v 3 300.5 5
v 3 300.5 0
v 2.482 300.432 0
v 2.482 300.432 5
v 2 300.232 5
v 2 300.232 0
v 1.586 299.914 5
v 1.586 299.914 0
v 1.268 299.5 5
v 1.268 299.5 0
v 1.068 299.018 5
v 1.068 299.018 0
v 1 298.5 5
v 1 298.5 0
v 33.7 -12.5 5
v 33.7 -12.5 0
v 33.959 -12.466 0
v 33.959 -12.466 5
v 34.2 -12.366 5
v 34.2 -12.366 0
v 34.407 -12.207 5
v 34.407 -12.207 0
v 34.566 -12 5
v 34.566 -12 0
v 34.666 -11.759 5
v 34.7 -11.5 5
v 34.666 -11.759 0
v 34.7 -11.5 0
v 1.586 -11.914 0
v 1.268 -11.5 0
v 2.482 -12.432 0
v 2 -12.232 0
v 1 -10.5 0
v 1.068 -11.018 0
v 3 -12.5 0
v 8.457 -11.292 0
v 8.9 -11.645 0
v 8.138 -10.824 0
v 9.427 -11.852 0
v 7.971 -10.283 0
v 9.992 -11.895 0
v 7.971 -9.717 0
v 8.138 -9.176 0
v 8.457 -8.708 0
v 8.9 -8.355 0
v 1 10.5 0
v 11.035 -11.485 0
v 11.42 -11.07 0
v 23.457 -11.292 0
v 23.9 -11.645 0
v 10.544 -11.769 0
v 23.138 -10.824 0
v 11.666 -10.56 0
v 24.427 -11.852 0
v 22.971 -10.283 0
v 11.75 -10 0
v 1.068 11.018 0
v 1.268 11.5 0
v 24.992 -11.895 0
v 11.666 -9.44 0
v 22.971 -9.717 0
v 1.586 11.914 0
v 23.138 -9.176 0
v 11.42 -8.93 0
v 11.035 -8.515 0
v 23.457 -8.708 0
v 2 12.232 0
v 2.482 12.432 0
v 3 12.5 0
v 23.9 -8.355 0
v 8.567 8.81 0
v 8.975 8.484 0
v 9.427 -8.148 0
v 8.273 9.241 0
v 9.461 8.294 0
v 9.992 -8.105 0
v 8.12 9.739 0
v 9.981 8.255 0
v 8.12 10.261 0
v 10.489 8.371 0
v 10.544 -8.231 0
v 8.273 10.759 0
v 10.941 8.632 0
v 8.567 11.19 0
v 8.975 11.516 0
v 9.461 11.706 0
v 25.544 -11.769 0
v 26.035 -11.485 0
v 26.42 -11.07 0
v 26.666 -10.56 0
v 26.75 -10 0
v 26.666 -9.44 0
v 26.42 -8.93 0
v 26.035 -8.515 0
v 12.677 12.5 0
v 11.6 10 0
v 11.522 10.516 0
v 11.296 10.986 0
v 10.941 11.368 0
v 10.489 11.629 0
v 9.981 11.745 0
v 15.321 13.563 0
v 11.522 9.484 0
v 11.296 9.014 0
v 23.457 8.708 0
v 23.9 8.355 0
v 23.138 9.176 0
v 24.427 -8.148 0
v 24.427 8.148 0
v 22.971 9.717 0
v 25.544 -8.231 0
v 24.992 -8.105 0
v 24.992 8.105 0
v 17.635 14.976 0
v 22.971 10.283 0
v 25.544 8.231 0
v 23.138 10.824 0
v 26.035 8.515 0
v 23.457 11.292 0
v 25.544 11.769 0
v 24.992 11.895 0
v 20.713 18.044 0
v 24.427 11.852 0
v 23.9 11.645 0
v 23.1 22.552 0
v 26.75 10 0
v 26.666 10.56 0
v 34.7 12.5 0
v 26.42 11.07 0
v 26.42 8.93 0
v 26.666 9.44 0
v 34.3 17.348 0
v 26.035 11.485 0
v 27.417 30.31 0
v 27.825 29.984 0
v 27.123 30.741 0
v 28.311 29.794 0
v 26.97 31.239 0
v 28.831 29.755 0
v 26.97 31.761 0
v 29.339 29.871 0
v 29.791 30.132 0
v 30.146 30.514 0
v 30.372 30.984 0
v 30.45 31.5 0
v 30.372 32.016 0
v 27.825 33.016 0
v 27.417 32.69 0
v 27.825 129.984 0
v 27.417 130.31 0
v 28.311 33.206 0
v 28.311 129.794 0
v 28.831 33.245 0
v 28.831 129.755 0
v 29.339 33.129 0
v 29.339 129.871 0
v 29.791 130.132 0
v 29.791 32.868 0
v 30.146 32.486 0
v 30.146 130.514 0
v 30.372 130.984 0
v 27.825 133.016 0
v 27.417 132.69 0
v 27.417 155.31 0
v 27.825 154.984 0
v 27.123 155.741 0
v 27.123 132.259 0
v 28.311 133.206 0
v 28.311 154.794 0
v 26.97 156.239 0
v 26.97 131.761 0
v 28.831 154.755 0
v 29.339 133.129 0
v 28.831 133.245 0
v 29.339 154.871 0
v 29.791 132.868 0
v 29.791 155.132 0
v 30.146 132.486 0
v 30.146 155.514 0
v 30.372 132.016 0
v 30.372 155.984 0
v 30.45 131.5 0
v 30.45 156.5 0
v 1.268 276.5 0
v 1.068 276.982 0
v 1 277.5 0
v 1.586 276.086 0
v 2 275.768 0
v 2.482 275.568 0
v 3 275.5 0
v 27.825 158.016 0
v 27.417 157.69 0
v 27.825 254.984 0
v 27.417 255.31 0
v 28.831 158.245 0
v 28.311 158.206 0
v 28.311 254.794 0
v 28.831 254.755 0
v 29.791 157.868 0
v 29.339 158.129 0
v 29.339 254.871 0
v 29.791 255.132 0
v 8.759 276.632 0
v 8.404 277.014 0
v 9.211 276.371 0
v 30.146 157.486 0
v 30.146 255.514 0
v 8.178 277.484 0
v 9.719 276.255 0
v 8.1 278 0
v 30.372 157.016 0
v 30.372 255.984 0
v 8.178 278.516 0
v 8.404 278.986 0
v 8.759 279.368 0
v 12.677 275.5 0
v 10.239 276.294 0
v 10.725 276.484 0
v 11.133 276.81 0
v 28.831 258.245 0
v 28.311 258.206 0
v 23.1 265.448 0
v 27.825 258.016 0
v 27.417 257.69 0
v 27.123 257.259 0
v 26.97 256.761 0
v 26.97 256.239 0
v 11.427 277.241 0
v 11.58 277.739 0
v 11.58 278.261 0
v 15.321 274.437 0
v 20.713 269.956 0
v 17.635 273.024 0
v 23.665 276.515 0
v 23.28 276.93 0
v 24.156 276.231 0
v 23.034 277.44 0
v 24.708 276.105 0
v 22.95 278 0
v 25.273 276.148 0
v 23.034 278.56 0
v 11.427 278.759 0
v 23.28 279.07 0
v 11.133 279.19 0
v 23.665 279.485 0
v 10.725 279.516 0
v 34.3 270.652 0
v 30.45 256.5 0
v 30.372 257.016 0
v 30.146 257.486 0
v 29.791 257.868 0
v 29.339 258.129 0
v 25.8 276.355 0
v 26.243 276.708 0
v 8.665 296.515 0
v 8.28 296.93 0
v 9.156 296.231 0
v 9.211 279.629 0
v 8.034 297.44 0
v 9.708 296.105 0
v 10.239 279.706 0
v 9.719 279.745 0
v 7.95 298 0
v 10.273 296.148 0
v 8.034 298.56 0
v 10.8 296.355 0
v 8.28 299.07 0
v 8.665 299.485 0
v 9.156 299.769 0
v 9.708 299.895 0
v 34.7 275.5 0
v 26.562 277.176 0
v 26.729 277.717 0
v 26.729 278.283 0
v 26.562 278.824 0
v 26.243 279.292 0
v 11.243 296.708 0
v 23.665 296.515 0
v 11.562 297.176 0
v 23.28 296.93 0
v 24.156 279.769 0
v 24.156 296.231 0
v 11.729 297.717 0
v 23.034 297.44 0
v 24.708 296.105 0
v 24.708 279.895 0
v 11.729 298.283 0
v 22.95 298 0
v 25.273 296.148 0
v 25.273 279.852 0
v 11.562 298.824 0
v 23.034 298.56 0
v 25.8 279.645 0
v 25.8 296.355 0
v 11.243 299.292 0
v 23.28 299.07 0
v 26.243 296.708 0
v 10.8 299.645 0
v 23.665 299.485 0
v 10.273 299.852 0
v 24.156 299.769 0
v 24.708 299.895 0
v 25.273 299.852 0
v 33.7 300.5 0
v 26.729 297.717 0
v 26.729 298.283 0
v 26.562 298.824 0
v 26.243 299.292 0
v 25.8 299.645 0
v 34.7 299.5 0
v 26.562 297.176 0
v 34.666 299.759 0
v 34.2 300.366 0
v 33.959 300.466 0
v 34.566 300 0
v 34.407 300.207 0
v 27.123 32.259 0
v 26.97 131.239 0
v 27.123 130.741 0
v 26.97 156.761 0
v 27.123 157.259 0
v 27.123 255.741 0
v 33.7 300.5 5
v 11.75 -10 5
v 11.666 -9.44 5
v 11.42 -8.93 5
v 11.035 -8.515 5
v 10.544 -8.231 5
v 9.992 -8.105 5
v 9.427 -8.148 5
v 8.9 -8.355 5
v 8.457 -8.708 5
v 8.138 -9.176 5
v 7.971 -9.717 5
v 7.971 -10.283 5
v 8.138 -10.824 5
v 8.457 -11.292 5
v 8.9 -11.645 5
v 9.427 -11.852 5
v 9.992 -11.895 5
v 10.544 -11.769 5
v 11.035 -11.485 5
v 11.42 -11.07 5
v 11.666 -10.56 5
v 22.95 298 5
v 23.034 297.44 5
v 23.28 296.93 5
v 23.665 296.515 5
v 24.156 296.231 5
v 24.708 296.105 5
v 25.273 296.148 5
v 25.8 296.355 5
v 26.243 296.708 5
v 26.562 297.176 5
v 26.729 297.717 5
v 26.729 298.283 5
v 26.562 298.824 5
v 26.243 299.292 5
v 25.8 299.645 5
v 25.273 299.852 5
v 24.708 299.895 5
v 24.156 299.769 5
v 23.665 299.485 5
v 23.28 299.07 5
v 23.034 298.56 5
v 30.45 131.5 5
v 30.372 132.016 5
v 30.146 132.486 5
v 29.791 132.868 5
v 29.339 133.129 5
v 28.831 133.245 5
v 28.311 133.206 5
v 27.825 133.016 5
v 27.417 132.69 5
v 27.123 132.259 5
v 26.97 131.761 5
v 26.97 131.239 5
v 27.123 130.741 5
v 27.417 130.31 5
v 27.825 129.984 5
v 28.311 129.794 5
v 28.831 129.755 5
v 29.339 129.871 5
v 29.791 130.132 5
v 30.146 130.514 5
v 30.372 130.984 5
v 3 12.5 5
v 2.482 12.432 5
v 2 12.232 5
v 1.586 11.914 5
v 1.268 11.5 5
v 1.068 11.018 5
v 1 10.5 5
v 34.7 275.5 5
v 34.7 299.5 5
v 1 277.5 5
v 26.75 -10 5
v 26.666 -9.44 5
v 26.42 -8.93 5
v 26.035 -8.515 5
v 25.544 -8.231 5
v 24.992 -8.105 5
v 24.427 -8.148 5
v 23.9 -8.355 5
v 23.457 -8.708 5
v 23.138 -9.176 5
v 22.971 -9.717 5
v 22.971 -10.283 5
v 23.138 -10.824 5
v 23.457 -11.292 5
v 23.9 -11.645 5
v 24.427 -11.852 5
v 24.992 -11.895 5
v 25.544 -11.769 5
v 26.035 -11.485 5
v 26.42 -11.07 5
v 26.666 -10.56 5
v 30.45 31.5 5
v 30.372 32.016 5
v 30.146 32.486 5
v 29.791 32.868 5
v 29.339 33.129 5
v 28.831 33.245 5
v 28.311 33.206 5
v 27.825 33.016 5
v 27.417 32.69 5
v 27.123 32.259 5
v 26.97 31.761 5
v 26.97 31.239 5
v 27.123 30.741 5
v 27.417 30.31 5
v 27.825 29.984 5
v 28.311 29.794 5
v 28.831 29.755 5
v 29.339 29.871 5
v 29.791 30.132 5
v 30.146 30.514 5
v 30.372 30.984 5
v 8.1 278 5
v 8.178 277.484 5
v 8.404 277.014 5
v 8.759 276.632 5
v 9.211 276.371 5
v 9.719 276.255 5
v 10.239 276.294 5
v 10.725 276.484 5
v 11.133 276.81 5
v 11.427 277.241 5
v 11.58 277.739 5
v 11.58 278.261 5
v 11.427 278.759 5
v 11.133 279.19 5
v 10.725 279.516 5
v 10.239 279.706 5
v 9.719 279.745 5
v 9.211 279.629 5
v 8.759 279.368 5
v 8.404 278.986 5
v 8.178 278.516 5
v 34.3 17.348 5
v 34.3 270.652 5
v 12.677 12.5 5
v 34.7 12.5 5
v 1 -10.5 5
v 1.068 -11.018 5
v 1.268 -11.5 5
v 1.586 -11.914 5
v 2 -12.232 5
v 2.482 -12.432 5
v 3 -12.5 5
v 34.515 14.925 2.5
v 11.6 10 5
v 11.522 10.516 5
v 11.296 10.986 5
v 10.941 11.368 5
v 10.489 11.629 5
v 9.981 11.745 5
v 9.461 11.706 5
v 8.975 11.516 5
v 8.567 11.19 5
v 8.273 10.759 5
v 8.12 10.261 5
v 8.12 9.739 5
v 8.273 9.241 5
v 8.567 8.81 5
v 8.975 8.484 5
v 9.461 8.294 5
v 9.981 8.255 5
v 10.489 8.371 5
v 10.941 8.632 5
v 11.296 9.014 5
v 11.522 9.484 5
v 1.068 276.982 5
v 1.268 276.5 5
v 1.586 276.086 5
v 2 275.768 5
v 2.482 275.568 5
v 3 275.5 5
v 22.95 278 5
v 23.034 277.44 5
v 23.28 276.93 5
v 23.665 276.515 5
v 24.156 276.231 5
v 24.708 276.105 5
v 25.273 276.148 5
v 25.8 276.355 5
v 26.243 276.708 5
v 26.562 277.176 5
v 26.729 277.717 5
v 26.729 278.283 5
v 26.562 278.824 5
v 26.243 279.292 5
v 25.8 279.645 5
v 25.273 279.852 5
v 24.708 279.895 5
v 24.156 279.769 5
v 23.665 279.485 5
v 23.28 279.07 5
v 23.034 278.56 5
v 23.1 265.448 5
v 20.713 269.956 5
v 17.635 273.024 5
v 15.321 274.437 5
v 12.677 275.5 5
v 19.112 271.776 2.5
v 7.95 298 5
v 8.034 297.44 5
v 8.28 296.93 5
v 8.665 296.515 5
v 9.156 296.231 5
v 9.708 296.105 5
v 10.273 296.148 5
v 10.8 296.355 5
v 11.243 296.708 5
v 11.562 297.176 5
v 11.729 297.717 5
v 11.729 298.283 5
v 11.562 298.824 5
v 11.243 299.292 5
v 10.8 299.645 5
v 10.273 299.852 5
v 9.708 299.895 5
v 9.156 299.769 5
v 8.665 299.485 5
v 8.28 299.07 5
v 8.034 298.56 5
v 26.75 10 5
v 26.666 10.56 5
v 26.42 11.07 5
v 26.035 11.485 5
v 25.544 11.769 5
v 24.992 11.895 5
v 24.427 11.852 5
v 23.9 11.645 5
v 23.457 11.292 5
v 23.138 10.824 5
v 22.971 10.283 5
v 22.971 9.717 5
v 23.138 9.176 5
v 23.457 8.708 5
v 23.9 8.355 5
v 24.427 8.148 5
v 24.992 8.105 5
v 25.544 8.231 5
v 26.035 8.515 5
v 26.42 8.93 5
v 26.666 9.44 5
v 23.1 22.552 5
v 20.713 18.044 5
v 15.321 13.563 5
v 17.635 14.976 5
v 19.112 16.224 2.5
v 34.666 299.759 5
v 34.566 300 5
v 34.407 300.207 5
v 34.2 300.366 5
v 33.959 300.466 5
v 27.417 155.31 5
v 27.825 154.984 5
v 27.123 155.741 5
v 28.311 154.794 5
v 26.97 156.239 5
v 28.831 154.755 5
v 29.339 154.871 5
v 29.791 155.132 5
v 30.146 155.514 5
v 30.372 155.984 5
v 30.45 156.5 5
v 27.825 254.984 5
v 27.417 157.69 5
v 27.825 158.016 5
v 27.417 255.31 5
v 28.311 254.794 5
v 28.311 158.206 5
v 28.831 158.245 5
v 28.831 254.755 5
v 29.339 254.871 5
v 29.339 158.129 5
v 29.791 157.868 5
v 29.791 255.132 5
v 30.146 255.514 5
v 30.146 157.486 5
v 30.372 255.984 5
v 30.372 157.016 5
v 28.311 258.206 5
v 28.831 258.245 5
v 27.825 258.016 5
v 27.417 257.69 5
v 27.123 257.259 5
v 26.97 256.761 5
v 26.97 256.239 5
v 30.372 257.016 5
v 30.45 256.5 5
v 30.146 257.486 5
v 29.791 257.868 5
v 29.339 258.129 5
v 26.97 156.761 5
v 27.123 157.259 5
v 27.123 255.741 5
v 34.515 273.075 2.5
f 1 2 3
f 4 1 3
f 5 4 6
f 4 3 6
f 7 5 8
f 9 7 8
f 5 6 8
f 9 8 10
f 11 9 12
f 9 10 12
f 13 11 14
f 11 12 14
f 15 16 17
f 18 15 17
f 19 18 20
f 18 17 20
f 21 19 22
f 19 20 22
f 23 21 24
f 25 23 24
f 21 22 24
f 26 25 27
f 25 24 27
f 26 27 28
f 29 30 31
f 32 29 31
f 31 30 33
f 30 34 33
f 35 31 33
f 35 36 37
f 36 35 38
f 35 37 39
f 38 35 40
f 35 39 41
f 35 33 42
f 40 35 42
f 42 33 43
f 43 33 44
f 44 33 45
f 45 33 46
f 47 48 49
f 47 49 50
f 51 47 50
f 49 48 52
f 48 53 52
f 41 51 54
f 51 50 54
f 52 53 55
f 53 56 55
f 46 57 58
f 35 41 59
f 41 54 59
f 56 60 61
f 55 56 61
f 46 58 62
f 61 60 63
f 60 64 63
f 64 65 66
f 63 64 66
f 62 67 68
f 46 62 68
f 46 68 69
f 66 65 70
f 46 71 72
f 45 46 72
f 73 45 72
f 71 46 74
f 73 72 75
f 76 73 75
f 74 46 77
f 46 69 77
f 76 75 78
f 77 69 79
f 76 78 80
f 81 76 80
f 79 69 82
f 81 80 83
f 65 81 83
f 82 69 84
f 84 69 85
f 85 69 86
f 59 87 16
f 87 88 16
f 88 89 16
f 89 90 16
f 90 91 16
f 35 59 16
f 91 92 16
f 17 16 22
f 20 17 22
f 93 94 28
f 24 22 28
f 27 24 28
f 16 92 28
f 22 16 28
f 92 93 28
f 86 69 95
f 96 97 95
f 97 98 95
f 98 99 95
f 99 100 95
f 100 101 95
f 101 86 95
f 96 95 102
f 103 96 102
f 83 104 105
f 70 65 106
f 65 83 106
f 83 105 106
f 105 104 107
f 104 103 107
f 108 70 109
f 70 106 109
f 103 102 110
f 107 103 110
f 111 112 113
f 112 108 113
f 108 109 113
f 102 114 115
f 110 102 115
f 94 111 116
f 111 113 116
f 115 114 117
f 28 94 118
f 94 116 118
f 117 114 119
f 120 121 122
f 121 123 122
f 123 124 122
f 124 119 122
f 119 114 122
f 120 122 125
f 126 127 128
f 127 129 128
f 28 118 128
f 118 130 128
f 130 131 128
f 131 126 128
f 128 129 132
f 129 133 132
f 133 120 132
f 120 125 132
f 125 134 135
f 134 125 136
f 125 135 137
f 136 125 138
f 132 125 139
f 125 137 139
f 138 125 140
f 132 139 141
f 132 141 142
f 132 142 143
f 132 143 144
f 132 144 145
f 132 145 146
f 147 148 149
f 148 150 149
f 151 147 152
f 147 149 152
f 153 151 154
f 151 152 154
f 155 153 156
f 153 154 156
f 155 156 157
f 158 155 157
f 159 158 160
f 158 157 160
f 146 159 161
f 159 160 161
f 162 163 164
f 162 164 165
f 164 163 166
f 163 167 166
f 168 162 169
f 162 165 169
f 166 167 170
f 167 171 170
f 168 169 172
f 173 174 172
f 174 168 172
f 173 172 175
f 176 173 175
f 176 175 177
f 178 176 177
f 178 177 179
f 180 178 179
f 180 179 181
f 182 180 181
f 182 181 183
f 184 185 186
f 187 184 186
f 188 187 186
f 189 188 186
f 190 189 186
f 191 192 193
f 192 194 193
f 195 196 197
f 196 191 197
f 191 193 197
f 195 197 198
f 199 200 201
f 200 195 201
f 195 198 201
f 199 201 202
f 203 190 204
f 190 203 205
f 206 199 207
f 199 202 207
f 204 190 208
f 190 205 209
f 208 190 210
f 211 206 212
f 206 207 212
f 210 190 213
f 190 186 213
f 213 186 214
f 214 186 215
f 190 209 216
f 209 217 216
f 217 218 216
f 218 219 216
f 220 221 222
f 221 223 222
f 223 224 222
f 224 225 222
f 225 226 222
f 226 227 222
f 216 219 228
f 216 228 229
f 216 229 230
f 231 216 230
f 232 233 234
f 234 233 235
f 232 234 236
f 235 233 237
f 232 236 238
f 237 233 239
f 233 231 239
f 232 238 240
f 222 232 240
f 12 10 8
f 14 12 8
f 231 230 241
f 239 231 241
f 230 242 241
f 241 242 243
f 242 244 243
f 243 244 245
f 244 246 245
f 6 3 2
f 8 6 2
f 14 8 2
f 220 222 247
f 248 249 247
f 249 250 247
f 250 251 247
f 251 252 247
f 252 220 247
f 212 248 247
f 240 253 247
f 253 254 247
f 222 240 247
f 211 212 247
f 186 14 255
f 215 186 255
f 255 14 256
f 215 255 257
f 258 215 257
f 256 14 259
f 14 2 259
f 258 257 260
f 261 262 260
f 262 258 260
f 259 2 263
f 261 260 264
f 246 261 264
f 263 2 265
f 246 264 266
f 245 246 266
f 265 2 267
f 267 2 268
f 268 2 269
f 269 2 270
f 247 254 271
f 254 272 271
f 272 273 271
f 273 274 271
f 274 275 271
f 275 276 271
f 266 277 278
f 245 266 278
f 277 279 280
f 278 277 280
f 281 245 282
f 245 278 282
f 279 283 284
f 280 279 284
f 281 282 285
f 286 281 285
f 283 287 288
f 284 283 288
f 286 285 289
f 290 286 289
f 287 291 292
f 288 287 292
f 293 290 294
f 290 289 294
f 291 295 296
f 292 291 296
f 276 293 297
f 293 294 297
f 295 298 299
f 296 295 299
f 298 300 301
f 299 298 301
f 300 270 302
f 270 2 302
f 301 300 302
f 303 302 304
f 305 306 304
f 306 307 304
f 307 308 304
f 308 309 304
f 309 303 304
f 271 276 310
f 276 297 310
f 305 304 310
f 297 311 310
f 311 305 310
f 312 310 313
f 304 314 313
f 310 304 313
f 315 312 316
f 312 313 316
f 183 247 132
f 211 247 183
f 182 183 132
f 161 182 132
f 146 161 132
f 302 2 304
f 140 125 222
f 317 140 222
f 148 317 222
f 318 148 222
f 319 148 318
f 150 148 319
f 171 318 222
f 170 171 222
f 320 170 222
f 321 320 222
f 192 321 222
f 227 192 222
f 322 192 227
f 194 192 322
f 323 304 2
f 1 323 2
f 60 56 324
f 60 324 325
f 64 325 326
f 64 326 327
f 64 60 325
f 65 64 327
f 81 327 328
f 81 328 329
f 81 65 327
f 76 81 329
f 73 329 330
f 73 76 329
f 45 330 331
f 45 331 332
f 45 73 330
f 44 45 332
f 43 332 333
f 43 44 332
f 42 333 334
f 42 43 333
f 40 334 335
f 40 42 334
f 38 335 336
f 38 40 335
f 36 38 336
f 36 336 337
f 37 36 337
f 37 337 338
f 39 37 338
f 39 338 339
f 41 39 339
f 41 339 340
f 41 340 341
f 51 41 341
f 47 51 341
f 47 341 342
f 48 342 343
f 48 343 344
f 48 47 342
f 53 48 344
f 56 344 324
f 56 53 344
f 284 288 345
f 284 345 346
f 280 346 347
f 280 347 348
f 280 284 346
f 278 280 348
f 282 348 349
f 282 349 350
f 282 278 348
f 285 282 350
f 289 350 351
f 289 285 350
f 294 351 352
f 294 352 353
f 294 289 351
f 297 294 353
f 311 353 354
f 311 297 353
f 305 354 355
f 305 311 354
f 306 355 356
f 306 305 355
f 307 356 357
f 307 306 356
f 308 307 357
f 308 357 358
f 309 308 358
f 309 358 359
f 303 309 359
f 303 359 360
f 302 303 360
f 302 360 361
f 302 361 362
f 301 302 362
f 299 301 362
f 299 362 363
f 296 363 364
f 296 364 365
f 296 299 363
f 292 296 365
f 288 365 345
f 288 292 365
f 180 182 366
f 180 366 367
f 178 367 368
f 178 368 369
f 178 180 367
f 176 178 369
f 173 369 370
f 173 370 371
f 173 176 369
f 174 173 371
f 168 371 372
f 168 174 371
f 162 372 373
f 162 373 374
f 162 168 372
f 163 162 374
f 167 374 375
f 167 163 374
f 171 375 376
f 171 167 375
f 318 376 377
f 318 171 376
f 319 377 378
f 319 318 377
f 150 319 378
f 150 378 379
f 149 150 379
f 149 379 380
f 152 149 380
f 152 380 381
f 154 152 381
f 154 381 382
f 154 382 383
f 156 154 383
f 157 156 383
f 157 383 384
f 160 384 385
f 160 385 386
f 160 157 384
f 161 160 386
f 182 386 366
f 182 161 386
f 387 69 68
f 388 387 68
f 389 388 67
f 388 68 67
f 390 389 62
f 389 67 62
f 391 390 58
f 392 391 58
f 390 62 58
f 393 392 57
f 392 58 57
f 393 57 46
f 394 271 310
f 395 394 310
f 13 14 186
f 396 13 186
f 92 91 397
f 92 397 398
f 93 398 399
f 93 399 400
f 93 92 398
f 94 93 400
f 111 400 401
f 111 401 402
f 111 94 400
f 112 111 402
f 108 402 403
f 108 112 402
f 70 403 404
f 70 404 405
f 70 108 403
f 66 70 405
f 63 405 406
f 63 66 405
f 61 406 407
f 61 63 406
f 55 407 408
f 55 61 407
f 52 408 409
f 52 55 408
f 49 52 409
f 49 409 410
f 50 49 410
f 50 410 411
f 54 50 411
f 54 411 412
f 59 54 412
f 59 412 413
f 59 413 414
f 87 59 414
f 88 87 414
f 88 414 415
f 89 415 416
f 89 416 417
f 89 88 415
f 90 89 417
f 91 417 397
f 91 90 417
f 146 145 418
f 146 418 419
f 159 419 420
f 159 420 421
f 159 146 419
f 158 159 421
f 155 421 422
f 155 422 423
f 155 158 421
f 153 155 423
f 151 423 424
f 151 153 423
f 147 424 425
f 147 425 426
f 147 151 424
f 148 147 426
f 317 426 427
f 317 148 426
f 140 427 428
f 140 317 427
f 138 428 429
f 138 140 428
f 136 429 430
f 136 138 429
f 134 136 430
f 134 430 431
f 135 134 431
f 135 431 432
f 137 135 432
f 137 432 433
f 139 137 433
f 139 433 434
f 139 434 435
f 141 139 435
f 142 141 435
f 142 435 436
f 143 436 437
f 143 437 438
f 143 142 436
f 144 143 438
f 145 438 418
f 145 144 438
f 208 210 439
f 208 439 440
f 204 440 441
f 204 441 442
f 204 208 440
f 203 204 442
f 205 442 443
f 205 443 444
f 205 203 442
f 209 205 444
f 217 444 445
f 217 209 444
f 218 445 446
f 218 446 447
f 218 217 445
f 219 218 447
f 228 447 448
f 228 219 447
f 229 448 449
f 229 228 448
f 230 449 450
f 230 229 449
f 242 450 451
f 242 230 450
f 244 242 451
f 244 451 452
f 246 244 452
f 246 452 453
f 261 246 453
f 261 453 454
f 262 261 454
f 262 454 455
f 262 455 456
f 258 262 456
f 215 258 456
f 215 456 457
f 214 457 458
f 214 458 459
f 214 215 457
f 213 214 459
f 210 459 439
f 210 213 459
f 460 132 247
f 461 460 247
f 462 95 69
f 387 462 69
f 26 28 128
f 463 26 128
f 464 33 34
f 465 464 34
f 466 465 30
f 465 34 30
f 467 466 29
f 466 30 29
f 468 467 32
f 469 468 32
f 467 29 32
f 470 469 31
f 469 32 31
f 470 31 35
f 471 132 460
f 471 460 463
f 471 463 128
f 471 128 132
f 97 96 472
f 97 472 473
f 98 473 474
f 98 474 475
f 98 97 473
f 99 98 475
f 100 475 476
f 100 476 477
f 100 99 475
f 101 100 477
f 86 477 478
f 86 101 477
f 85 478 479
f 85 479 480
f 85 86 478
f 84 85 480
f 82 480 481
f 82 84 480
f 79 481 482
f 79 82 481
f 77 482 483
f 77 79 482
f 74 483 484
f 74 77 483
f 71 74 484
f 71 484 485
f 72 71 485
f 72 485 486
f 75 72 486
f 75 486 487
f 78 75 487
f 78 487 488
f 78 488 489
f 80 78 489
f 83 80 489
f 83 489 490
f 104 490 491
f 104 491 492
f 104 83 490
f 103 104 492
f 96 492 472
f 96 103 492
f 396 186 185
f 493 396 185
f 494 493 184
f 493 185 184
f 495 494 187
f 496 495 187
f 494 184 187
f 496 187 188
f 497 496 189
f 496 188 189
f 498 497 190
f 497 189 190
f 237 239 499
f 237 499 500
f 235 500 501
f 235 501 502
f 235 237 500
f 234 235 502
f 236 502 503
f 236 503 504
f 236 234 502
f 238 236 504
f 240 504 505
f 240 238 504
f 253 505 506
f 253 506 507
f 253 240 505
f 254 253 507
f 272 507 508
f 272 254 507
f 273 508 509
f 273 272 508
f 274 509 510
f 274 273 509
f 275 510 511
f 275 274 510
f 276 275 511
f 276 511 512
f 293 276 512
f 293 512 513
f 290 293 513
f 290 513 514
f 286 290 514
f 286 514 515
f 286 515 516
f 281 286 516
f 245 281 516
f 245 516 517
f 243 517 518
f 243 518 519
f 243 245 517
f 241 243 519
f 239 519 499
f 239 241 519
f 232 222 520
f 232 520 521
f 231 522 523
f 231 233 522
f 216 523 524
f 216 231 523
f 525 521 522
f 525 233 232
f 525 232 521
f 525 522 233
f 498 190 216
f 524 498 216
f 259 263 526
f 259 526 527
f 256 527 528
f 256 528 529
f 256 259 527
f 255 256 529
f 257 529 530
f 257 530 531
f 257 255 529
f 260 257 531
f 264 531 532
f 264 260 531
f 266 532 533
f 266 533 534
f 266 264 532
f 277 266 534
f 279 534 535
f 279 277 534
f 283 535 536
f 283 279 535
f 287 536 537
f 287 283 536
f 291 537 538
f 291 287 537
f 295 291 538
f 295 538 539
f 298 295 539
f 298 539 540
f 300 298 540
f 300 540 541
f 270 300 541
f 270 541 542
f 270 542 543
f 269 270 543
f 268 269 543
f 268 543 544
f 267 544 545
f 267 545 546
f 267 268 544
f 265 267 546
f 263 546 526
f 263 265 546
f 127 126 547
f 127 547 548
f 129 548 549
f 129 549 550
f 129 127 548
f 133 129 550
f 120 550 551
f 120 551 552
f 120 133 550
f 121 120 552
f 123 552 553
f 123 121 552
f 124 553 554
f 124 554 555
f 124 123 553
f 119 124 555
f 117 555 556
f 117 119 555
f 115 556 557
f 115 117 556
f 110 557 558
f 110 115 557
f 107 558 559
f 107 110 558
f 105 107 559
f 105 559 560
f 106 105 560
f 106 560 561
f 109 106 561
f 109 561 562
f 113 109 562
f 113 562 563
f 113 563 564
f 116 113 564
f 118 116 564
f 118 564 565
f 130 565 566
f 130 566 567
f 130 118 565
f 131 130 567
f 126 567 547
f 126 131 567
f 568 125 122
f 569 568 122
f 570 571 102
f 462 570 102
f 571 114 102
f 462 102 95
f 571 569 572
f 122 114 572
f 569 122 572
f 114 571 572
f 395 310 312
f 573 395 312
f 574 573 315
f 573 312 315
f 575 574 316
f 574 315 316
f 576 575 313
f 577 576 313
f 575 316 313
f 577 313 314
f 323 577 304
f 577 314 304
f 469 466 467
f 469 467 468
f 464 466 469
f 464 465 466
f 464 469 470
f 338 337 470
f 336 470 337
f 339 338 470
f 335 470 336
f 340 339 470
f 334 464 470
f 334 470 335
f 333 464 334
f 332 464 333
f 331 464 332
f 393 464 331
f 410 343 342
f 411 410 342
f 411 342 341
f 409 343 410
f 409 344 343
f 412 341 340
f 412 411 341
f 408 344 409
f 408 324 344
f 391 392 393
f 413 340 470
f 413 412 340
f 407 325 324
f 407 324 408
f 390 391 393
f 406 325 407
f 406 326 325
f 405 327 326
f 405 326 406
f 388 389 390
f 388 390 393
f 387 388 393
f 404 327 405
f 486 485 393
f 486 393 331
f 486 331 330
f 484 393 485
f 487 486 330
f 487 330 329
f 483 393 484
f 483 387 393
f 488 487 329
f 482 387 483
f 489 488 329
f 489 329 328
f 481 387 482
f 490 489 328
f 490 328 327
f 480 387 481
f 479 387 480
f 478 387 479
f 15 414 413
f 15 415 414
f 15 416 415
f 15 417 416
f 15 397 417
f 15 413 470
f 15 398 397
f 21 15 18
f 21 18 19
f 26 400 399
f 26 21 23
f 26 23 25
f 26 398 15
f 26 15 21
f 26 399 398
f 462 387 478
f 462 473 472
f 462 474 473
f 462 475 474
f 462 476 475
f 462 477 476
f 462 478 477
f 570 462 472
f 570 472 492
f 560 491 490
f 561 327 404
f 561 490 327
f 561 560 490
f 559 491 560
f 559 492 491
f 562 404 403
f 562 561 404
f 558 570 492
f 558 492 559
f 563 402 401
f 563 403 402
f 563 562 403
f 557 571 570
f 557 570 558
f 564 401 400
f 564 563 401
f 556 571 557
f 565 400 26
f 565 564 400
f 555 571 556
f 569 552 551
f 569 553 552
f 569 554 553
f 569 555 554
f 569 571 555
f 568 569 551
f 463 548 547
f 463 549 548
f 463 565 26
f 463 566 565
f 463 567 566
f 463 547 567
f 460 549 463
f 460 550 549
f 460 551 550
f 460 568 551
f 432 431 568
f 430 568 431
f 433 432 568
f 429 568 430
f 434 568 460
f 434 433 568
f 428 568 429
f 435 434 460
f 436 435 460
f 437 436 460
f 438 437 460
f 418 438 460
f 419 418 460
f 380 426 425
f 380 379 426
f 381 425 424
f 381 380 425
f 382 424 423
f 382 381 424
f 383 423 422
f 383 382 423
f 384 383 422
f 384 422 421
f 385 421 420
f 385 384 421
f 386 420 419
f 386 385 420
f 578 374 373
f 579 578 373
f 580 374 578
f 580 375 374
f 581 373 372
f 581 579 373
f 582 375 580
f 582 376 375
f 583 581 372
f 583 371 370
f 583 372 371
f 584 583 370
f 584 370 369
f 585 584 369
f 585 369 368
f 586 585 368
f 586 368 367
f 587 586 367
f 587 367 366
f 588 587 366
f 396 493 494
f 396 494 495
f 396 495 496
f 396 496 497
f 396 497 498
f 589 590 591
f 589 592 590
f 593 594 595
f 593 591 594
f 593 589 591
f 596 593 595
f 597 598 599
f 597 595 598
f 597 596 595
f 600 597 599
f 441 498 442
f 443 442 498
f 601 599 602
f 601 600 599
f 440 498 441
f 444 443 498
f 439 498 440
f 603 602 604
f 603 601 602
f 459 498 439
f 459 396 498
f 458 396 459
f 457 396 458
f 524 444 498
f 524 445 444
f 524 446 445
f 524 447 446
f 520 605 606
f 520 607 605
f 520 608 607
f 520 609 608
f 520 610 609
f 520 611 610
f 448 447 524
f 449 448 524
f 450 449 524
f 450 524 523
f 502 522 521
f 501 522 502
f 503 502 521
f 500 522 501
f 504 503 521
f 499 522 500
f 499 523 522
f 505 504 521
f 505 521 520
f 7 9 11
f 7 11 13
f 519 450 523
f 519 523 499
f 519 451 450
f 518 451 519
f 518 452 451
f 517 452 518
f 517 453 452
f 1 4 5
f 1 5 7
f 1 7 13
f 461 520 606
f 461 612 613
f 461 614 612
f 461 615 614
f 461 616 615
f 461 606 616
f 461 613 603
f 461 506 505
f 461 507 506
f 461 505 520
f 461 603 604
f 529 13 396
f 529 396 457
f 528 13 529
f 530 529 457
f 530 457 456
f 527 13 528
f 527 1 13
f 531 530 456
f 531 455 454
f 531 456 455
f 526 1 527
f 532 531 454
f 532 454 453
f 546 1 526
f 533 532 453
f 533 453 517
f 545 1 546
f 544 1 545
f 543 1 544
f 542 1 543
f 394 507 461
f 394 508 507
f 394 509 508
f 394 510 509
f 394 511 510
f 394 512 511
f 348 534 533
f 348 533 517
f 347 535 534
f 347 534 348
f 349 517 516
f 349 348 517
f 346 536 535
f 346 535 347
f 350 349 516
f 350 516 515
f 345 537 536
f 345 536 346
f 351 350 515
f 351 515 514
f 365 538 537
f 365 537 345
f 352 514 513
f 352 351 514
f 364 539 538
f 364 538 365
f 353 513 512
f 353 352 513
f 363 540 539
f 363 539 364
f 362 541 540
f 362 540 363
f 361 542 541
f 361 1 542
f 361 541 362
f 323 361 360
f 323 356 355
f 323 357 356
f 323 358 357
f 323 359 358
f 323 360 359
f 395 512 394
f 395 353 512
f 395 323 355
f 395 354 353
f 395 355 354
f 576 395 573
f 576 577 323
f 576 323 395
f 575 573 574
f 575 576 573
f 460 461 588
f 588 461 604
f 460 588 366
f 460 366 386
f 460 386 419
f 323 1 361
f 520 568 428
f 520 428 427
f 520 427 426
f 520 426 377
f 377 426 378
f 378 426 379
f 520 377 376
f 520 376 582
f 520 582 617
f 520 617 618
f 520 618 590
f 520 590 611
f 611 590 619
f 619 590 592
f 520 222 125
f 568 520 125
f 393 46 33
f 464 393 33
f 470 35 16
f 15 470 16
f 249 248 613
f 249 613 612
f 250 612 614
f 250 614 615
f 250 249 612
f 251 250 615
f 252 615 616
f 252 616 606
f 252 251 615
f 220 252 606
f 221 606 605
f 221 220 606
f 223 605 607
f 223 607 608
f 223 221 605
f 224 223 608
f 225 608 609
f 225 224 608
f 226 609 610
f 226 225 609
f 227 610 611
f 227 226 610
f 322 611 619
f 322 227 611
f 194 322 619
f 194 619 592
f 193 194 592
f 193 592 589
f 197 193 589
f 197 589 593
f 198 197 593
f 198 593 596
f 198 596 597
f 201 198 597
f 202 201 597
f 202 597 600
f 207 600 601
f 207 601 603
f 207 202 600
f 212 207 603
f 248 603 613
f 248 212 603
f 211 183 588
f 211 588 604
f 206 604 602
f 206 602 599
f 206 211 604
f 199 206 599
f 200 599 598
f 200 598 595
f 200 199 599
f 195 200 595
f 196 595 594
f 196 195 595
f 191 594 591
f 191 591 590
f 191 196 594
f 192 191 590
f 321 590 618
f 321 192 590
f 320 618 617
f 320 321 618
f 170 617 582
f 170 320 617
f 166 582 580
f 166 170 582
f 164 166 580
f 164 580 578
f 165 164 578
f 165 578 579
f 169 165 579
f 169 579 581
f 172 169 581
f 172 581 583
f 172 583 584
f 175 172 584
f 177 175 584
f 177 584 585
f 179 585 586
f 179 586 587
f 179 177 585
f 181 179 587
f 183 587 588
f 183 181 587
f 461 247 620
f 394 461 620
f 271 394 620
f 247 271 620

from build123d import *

# Parameters (mm, degrees)
SKETCH1_R           = 1.9
SKETCH1_R_2         = 1.75
BOSS_EXTRUDE1_DEPTH = 5


with BuildPart() as part:
    # Sketch1 → Boss-Extrude1 (new body)
    with BuildSketch(Plane.XY):
        with BuildLine():
            Line((22.7, -12.5), (33.7, -12.5))
            ThreePointArc((33.7, -12.5), (34.407106781, -12.207106781), (34.7, -11.5))
            Line((34.7, -11.5), (34.7, 12.5))
            add(Edge.make_bspline(
                [(34.3, 17.348309182), (34.529755129, 14.926573724), (34.7, 12.5)],
                knots=[0, 0, 0, 1, 1, 1], degree=2))
            Line((34.3, 17.348309182), (34.3, 270.651690818))
            add(Edge.make_bspline(
                [(34.3, 270.651690818), (34.529755129, 273.073426276), (34.7, 275.5)],
                knots=[0, 0, 0, 1, 1, 1], degree=2))
            Line((34.7, 275.5), (34.7, 299.5))
            ThreePointArc((34.7, 299.5), (34.407106781, 300.207106781), (33.7, 300.5))
            Line((33.7, 300.5), (22.7, 300.5))
            Line((22.7, 300.5), (3, 300.5))
            ThreePointArc((3, 300.5), (1.585786438, 299.914213562), (1, 298.5))
            Line((1, 298.5), (1, 277.5))
            ThreePointArc((1, 277.5), (1.585786438, 276.085786438), (3, 275.5))
            Line((3, 275.5), (12.676771392, 275.5))
            add(Edge.make_bspline(
                [(23.1, 265.447646174), (20.336020381, 273.078870877), (12.676771392, 275.5)],
                knots=[0, 0, 0, 1, 1, 1], degree=2))
            Line((23.1, 265.447646174), (23.1, 22.552353826))
            add(Edge.make_bspline(
                [(23.1, 22.552353826), (20.336020381, 14.921129123), (12.676771392, 12.5)],
                knots=[0, 0, 0, 1, 1, 1], degree=2))
            Line((12.676771392, 12.5), (3, 12.5))
            ThreePointArc((3, 12.5), (1.585786438, 11.914213562), (1, 10.5))
            Line((1, 10.5), (1, -10.5))
            ThreePointArc((1, -10.5), (1.585786438, -11.914213562), (3, -12.5))
            Line((3, -12.5), (22.7, -12.5))
        make_face()
        with Locations((9.85, -10)):
            Circle(SKETCH1_R, mode=Mode.SUBTRACT)
        with Locations((9.85, 10)):
            Circle(SKETCH1_R_2, mode=Mode.SUBTRACT)
        with Locations((24.85, 10)):
            Circle(SKETCH1_R, mode=Mode.SUBTRACT)
        with Locations((24.85, -10)):
            Circle(SKETCH1_R, mode=Mode.SUBTRACT)
        with Locations((28.7, 131.5)):
            Circle(SKETCH1_R_2, mode=Mode.SUBTRACT)
        with Locations((28.7, 156.5)):
            Circle(SKETCH1_R_2, mode=Mode.SUBTRACT)
        with Locations((28.7, 256.5)):
            Circle(SKETCH1_R_2, mode=Mode.SUBTRACT)
        with Locations((28.7, 31.5)):
            Circle(SKETCH1_R_2, mode=Mode.SUBTRACT)
        with Locations(Location((24.85, 298, 0), (0, 0, 180))):
            Circle(SKETCH1_R, mode=Mode.SUBTRACT)
        with Locations(Location((24.85, 278, 0), (0, 0, 180))):
            Circle(SKETCH1_R, mode=Mode.SUBTRACT)
        with Locations(Location((9.85, 278, 0), (0, 0, 180))):
            Circle(SKETCH1_R_2, mode=Mode.SUBTRACT)
        with Locations(Location((9.85, 298, 0), (0, 0, 180))):
            Circle(SKETCH1_R, mode=Mode.SUBTRACT)
    extrude(amount=BOSS_EXTRUDE1_DEPTH)


solid = part.part
